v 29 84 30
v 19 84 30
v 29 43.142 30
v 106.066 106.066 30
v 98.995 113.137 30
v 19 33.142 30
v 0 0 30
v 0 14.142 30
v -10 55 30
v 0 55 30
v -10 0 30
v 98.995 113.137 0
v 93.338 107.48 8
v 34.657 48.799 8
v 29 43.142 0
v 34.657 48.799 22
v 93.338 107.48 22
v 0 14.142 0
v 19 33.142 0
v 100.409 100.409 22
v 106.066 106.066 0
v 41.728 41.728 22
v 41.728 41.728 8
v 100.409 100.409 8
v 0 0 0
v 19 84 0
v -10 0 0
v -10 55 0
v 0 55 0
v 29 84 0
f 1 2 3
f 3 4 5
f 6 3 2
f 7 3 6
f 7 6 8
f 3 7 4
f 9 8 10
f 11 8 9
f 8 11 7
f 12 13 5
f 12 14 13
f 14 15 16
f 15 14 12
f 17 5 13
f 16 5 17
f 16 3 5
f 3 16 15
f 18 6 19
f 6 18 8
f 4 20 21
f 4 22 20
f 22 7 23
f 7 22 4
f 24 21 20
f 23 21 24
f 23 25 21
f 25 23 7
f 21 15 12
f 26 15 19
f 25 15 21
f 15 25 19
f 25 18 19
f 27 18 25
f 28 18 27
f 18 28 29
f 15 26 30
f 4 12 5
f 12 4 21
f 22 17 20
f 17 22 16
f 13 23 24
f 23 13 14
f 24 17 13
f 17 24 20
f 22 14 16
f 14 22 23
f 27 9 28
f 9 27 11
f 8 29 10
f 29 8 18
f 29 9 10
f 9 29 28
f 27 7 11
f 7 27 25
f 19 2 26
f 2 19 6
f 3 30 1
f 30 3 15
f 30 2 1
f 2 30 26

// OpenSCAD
// file: constants.scad
$fn = 20;

width = 30;
base_length = 150;
finger_length = 55;
thickness_part = 10;
gap_part = 1;

base_wall_thickness = 8;

// zenbook
thickness_pc = 19;
finger_angle = 45;
// macbook pro
//thickness_pc = 15;
//finger_angle = 45;
// let's note
// thickness_pc = 10;
// finger_angle = 65;

gap_y = (thickness_pc+thickness_part)/sin(finger_angle);
foot_inclination = 15;
// main file
include <constants.scad>;

rotate([0, -90, -45]) {
     stand();
}

module stand() {
     difference() {
        cube([width, base_length, thickness_part]);
        
        translate([
         base_wall_thickness, 
         gap_y + thickness_part + base_wall_thickness, 
         -1])
         cube([
            width - base_wall_thickness * 2, 
            base_length - gap_y - thickness_part - base_wall_thickness * 2,
            thickness_part + 2
         ]);
    }
    
    finger();
    translate([0, gap_y, 0]) finger();
}

module finger() {
     rotate([finger_angle, 0, 0]) cube([width, finger_length, thickness_part]);
}
